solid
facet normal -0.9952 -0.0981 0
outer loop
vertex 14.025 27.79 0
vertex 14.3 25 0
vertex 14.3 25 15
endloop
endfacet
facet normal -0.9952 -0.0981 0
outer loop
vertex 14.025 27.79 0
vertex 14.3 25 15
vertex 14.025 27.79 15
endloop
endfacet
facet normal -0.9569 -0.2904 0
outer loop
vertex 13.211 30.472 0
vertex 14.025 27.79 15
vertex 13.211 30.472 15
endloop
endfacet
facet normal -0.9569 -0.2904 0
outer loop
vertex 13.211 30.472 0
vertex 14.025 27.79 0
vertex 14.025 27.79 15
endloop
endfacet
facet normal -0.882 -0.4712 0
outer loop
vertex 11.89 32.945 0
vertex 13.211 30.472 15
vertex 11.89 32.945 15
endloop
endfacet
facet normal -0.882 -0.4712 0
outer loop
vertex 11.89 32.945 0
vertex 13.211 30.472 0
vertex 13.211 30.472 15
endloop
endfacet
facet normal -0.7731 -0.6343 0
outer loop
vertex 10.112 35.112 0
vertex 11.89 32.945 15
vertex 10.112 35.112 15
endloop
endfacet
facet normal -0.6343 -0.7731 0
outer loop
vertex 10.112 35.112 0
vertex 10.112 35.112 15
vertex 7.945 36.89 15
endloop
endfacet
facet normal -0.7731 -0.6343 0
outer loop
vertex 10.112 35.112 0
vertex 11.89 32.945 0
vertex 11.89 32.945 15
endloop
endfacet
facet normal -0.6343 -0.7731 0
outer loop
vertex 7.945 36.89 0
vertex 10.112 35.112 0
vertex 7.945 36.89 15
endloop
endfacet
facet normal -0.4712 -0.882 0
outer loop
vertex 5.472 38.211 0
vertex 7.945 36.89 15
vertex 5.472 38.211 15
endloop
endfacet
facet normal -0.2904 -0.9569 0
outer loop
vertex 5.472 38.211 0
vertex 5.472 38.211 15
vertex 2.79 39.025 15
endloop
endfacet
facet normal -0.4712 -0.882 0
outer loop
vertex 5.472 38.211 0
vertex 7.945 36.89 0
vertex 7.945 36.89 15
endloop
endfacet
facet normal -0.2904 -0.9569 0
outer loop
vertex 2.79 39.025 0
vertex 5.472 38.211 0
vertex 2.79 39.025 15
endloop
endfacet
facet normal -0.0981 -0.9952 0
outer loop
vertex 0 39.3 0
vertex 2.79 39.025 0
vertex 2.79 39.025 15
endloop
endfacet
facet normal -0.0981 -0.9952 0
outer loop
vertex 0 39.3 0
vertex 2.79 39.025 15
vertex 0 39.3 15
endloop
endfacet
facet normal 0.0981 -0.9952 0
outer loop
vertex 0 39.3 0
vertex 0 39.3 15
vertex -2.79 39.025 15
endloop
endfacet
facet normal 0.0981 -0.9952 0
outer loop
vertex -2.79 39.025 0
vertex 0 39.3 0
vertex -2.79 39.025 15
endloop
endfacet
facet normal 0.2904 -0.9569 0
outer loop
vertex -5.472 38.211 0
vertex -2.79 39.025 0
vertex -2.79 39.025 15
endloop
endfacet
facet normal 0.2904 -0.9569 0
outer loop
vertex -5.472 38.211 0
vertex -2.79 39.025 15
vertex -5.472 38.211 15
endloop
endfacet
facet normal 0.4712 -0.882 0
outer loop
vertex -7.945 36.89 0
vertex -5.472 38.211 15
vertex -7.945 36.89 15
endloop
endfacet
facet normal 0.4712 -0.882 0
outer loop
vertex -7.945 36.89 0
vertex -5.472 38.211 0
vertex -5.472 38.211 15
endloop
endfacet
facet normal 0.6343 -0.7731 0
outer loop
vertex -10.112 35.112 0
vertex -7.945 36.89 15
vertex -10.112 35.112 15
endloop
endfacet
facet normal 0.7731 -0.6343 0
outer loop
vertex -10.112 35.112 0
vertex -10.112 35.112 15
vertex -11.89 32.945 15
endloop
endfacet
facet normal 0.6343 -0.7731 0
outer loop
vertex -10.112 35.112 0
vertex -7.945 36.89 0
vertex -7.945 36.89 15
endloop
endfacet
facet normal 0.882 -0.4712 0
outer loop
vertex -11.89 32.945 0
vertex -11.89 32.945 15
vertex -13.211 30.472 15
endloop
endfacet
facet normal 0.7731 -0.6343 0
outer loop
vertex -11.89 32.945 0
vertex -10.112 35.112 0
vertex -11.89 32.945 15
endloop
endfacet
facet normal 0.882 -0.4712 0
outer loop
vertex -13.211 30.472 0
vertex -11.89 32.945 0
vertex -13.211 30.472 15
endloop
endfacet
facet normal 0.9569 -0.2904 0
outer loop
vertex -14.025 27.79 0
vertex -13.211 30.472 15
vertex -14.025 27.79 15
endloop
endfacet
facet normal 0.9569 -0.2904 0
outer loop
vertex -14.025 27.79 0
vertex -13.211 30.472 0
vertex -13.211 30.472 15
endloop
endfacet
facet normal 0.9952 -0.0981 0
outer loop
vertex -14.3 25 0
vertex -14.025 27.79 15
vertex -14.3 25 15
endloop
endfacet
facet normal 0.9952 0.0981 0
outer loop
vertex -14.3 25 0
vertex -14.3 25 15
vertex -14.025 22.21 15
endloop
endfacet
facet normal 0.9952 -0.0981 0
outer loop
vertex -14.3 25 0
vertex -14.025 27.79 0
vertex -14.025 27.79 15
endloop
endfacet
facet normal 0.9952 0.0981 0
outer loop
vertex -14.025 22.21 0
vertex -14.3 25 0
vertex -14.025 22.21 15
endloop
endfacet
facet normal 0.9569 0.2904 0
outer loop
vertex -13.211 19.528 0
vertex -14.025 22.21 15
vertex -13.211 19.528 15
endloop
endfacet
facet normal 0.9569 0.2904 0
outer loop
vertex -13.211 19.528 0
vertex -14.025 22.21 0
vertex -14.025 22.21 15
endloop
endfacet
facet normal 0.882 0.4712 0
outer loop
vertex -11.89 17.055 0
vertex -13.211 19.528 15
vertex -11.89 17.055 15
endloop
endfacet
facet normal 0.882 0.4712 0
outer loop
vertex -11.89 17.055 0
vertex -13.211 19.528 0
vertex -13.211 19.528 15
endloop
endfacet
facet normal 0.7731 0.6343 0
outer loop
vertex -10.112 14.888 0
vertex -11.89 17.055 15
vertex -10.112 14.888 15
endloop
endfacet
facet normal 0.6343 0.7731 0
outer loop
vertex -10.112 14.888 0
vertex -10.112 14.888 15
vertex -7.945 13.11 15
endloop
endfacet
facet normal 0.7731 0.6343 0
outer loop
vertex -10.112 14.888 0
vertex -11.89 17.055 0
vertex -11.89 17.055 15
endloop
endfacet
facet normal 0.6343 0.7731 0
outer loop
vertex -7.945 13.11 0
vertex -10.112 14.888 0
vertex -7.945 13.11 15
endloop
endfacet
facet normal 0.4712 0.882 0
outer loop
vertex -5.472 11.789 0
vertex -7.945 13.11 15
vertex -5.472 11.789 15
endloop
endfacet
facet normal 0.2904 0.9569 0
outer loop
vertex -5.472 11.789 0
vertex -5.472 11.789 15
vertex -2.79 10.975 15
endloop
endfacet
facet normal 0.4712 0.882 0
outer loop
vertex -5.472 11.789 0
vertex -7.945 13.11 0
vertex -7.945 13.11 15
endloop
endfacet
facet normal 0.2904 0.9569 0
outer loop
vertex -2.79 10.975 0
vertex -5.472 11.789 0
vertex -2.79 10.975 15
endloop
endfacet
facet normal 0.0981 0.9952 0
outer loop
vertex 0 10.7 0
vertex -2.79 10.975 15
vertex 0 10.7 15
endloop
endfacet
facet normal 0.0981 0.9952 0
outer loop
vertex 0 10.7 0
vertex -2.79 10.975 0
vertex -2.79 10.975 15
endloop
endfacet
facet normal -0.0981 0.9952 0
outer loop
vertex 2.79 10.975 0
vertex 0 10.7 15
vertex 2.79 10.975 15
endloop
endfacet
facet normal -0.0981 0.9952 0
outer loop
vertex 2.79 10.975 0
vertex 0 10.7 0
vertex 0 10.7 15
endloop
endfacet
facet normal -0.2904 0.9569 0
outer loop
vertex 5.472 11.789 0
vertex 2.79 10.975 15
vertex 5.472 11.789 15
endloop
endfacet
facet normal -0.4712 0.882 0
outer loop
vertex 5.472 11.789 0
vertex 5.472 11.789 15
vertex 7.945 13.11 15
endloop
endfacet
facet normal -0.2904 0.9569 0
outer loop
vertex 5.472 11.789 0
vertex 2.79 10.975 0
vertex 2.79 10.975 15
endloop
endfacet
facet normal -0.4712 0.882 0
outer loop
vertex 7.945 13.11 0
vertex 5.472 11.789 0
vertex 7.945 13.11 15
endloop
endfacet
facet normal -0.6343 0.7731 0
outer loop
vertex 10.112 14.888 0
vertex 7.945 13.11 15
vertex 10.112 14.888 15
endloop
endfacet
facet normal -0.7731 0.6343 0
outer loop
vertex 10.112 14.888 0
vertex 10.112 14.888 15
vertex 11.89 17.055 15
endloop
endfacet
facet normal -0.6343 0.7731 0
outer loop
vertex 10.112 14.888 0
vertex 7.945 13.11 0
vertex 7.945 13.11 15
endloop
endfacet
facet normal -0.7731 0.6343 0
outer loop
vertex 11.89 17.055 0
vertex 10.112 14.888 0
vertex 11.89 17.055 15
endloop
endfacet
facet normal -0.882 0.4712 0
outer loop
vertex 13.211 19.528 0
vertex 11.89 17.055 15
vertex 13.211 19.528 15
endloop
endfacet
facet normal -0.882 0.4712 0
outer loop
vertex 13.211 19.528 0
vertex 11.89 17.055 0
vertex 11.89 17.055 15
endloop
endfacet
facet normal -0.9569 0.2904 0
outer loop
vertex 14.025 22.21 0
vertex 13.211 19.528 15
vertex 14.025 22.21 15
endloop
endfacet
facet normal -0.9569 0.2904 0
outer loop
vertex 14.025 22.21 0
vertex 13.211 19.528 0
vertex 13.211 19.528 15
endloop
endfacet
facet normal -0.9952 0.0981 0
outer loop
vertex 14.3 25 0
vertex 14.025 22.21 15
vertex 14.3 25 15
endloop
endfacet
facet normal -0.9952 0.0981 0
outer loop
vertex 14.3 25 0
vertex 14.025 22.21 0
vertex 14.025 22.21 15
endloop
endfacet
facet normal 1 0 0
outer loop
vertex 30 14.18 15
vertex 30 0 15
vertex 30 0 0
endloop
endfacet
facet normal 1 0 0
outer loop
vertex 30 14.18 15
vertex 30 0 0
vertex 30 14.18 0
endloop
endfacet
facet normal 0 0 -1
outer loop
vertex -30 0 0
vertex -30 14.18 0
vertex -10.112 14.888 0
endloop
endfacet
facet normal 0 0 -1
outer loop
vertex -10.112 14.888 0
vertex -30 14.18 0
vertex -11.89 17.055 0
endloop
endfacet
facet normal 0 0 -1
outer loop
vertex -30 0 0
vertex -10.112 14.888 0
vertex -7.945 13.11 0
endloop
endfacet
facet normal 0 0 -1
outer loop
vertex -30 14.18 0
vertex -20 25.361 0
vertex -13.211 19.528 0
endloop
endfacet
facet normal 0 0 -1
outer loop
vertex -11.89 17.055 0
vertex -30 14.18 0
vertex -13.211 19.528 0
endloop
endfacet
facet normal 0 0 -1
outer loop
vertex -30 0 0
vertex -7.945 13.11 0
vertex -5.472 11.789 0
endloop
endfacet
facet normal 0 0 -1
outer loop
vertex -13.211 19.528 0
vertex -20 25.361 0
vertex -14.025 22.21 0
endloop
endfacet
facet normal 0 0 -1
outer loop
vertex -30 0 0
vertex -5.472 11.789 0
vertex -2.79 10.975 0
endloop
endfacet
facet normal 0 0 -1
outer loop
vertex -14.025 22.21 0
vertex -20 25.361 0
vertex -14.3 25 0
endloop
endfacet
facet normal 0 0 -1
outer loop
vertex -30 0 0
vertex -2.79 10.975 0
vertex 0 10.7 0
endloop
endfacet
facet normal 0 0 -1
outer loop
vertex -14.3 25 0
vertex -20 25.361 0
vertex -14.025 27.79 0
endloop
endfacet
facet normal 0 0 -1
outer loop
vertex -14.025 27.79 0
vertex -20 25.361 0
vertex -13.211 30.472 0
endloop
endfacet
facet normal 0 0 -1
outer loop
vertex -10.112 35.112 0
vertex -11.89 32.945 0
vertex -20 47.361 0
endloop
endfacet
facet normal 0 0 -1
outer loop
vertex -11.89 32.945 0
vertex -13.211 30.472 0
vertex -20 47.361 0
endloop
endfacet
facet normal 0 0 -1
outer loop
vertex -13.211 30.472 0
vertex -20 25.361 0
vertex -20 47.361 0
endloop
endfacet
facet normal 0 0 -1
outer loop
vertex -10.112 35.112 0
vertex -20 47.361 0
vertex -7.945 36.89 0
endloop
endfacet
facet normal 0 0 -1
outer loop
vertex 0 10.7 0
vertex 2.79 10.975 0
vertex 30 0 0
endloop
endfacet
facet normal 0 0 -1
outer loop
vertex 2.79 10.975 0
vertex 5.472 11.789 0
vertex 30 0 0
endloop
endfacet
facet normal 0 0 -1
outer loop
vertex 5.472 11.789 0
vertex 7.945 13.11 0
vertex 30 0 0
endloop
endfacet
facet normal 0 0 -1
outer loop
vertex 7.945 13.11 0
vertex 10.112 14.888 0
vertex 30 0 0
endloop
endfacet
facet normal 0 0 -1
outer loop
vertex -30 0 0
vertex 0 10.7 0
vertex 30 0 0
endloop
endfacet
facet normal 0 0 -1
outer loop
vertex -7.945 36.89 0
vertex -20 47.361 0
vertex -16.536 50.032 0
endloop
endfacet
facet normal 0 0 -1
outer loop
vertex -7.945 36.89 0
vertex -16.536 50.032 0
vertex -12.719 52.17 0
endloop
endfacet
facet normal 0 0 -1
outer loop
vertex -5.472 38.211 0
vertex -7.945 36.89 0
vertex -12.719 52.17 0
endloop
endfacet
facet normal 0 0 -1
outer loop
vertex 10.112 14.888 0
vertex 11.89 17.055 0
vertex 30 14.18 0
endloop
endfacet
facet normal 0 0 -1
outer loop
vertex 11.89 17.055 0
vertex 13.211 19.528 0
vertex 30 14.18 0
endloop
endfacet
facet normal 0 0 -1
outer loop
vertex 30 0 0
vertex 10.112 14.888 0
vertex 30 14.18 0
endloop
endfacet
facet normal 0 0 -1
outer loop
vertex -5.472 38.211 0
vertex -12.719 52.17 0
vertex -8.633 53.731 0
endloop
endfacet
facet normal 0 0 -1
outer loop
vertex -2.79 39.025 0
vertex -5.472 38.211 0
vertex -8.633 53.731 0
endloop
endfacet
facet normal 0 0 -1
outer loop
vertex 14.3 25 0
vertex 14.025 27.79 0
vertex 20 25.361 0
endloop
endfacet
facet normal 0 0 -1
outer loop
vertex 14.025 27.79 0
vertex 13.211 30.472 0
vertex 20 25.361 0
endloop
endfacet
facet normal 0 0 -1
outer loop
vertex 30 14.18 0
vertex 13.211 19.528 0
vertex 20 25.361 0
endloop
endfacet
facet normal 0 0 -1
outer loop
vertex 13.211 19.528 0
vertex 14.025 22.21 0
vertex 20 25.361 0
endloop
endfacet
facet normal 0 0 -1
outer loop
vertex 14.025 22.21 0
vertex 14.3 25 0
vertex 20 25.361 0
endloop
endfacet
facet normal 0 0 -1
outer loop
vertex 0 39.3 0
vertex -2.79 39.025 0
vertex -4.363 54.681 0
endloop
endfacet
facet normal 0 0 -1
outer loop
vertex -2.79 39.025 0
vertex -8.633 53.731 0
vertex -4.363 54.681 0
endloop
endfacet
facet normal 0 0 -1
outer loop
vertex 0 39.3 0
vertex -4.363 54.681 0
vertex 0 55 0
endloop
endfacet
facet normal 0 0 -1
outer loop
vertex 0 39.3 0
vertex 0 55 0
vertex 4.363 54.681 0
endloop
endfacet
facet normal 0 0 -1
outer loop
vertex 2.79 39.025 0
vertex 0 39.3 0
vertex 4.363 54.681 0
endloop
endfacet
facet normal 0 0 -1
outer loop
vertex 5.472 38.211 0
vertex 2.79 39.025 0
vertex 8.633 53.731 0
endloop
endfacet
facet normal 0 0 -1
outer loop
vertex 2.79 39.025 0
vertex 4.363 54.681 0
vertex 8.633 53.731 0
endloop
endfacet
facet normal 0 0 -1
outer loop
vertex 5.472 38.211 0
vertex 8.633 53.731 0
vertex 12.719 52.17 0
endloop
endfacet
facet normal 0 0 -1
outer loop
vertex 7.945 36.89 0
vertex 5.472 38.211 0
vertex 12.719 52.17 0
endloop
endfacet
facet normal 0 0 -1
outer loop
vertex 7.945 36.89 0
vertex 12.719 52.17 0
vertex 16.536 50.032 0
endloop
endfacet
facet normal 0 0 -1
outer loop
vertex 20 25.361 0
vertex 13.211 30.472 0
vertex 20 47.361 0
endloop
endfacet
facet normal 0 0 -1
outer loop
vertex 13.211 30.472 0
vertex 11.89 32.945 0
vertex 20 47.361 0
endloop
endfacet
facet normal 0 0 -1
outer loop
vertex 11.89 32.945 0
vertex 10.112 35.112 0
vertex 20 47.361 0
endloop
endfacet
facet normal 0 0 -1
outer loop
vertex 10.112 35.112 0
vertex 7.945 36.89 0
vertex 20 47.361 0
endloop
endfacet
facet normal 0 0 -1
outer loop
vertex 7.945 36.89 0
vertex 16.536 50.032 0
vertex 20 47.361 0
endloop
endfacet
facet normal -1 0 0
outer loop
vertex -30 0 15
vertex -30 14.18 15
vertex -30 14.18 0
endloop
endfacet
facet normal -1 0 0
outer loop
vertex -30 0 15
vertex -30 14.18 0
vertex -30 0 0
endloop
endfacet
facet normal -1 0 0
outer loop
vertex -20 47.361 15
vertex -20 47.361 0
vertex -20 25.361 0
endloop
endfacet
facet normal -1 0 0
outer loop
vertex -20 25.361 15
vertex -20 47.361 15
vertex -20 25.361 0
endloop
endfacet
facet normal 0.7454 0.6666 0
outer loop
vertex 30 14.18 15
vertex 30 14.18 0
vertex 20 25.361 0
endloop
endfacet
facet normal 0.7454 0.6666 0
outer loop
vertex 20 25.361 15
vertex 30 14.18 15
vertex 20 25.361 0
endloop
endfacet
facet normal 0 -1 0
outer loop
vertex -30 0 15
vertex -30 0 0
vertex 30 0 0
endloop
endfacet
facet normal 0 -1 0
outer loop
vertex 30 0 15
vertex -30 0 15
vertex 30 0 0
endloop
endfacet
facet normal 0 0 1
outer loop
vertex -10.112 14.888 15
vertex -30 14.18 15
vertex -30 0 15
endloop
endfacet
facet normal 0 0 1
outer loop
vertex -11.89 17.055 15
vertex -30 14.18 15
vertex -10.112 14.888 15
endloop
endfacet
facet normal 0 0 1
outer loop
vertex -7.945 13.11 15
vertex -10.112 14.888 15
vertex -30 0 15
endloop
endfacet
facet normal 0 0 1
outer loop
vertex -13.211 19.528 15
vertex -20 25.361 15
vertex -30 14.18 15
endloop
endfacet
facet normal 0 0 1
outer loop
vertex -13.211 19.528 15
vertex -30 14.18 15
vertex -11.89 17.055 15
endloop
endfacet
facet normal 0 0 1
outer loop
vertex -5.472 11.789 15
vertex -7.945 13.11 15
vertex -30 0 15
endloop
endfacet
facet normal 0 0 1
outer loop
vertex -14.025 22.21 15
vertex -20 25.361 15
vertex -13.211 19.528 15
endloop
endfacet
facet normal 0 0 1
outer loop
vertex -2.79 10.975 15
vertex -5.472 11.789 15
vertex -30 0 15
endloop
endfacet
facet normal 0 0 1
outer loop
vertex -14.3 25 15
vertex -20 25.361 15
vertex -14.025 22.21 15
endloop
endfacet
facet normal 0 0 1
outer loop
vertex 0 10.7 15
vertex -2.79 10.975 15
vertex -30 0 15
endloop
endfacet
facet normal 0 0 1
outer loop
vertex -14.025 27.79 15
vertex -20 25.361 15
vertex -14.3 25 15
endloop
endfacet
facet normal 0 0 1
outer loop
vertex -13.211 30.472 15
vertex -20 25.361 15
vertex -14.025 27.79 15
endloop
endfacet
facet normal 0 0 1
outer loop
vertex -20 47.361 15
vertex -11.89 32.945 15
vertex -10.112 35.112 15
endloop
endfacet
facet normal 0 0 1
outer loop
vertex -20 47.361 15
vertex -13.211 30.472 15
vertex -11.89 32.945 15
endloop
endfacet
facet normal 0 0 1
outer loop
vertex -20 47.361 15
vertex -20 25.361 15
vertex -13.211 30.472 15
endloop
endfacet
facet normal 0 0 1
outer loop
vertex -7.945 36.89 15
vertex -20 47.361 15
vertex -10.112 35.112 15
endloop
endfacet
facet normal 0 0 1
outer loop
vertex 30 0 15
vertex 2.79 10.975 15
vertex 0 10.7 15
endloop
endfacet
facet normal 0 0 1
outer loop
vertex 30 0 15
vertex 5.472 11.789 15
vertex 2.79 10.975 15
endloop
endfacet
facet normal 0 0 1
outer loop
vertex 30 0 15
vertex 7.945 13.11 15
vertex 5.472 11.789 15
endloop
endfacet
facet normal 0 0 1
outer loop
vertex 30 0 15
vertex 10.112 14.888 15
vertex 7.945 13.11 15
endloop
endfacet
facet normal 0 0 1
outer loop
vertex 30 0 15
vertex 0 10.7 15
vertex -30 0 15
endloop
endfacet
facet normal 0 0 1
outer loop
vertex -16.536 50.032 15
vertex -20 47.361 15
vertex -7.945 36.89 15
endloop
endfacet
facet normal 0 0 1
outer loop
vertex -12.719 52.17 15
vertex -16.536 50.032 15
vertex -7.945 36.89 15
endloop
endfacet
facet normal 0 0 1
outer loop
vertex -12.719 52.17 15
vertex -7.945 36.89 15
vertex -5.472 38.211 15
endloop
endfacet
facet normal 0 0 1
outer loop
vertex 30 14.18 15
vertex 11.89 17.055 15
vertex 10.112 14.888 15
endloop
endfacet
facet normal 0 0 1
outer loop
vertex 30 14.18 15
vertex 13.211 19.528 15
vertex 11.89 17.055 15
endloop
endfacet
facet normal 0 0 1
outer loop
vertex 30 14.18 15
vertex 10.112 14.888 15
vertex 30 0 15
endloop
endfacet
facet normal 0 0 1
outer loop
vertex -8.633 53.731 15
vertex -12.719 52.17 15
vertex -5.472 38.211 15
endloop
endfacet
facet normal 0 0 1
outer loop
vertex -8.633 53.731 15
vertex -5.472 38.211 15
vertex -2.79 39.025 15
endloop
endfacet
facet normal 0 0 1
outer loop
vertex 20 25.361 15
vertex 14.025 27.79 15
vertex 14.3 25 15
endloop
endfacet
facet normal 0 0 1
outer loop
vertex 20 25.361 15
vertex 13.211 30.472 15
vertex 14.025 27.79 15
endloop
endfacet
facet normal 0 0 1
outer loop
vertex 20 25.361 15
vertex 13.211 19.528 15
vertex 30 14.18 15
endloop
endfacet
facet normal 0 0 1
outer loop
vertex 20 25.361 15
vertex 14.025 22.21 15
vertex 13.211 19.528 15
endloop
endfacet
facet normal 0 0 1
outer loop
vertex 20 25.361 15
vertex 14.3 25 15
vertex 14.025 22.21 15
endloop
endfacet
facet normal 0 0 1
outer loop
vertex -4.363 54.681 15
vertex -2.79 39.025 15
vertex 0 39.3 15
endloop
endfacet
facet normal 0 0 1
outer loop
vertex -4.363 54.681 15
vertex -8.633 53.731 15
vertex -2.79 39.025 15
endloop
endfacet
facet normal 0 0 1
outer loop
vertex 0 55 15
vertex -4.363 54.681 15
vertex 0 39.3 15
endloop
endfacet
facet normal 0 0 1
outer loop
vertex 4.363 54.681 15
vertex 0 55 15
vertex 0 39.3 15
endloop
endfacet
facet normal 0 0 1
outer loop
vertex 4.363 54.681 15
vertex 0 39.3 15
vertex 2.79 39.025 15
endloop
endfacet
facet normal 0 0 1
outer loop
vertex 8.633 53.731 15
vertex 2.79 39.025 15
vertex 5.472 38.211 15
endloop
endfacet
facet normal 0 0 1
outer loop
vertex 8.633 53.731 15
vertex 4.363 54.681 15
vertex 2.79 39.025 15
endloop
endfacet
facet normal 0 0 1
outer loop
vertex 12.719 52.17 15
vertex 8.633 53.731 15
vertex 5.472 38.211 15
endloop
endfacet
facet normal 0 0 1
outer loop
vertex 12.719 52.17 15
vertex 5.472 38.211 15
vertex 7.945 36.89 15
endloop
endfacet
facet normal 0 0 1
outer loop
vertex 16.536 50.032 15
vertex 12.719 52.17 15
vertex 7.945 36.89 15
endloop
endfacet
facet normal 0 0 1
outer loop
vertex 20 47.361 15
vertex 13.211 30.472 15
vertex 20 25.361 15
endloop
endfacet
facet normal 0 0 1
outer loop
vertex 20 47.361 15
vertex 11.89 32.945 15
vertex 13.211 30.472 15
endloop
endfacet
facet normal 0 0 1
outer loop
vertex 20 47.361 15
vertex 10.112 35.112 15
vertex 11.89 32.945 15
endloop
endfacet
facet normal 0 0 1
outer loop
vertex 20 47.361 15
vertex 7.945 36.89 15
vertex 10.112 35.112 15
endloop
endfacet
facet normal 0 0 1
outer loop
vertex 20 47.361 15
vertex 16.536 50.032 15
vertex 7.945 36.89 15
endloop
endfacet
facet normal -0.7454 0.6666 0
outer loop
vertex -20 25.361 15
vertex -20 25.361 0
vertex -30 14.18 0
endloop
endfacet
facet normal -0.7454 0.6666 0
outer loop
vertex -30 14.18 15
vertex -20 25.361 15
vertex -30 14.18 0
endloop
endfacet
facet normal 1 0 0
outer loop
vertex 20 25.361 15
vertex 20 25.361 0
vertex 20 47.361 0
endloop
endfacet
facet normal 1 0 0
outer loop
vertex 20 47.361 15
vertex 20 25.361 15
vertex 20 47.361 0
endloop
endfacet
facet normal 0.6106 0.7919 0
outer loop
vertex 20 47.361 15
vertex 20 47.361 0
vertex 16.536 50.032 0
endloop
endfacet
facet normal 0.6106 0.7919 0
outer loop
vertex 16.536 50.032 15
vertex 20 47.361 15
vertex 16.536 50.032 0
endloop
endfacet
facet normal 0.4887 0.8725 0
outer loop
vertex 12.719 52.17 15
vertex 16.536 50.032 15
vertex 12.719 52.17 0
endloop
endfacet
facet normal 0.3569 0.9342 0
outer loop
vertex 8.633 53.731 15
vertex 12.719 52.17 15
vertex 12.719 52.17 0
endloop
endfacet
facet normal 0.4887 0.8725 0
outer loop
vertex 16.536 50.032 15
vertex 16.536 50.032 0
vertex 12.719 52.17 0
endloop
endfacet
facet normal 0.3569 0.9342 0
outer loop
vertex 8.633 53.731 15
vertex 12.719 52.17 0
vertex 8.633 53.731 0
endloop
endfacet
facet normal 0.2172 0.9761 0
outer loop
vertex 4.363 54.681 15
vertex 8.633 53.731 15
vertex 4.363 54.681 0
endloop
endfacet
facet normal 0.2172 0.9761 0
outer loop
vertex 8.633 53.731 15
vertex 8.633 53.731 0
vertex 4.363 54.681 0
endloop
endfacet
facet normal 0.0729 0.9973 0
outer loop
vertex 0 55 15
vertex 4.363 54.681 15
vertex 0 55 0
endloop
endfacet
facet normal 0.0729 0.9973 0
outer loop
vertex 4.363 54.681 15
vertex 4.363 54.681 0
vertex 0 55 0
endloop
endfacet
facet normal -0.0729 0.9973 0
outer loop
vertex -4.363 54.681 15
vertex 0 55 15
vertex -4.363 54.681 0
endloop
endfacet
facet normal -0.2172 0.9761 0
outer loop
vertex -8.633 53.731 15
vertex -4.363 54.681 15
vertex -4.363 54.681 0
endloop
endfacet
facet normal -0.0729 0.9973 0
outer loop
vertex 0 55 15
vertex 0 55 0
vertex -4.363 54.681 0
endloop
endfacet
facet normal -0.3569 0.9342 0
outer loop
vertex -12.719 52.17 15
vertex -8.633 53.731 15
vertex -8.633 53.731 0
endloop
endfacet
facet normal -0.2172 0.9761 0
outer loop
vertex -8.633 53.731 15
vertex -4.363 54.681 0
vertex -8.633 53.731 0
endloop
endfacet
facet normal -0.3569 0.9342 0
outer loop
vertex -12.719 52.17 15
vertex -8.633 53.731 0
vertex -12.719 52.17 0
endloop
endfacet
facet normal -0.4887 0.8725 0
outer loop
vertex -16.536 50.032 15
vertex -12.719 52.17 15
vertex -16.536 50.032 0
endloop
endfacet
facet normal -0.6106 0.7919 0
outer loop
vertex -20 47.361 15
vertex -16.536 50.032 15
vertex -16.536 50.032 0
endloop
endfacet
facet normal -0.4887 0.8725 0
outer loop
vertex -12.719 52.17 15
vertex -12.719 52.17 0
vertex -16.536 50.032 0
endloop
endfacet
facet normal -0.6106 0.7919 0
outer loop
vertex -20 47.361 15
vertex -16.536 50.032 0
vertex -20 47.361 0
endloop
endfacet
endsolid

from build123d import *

# Parameters (mm, degrees)
SKETCH1_R           = 14.3
BOSS_EXTRUDE1_DEPTH = 15


with BuildPart() as part:
    # Sketch1 → Boss-Extrude1 (new body)
    with BuildSketch(Plane.XY):
        with BuildLine():
            Line((-30, 0), (30, 0))
            Line((30, 0), (30, 14.180339887))
            Line((30, 14.180339887), (20, 25.360679775))
            Line((20, 25.360679775), (20, 47.360679775))
            ThreePointArc((20, 47.360679775), (0, 55), (-20, 47.360679775))
            Line((-20, 47.360679775), (-20, 25.360679775))
            Line((-20, 25.360679775), (-30, 14.180339887))
            Line((-30, 14.180339887), (-30, 0))
        make_face()
        with Locations((0, 25)):
            Circle(SKETCH1_R, mode=Mode.SUBTRACT)
    extrude(amount=BOSS_EXTRUDE1_DEPTH)


solid = part.part
